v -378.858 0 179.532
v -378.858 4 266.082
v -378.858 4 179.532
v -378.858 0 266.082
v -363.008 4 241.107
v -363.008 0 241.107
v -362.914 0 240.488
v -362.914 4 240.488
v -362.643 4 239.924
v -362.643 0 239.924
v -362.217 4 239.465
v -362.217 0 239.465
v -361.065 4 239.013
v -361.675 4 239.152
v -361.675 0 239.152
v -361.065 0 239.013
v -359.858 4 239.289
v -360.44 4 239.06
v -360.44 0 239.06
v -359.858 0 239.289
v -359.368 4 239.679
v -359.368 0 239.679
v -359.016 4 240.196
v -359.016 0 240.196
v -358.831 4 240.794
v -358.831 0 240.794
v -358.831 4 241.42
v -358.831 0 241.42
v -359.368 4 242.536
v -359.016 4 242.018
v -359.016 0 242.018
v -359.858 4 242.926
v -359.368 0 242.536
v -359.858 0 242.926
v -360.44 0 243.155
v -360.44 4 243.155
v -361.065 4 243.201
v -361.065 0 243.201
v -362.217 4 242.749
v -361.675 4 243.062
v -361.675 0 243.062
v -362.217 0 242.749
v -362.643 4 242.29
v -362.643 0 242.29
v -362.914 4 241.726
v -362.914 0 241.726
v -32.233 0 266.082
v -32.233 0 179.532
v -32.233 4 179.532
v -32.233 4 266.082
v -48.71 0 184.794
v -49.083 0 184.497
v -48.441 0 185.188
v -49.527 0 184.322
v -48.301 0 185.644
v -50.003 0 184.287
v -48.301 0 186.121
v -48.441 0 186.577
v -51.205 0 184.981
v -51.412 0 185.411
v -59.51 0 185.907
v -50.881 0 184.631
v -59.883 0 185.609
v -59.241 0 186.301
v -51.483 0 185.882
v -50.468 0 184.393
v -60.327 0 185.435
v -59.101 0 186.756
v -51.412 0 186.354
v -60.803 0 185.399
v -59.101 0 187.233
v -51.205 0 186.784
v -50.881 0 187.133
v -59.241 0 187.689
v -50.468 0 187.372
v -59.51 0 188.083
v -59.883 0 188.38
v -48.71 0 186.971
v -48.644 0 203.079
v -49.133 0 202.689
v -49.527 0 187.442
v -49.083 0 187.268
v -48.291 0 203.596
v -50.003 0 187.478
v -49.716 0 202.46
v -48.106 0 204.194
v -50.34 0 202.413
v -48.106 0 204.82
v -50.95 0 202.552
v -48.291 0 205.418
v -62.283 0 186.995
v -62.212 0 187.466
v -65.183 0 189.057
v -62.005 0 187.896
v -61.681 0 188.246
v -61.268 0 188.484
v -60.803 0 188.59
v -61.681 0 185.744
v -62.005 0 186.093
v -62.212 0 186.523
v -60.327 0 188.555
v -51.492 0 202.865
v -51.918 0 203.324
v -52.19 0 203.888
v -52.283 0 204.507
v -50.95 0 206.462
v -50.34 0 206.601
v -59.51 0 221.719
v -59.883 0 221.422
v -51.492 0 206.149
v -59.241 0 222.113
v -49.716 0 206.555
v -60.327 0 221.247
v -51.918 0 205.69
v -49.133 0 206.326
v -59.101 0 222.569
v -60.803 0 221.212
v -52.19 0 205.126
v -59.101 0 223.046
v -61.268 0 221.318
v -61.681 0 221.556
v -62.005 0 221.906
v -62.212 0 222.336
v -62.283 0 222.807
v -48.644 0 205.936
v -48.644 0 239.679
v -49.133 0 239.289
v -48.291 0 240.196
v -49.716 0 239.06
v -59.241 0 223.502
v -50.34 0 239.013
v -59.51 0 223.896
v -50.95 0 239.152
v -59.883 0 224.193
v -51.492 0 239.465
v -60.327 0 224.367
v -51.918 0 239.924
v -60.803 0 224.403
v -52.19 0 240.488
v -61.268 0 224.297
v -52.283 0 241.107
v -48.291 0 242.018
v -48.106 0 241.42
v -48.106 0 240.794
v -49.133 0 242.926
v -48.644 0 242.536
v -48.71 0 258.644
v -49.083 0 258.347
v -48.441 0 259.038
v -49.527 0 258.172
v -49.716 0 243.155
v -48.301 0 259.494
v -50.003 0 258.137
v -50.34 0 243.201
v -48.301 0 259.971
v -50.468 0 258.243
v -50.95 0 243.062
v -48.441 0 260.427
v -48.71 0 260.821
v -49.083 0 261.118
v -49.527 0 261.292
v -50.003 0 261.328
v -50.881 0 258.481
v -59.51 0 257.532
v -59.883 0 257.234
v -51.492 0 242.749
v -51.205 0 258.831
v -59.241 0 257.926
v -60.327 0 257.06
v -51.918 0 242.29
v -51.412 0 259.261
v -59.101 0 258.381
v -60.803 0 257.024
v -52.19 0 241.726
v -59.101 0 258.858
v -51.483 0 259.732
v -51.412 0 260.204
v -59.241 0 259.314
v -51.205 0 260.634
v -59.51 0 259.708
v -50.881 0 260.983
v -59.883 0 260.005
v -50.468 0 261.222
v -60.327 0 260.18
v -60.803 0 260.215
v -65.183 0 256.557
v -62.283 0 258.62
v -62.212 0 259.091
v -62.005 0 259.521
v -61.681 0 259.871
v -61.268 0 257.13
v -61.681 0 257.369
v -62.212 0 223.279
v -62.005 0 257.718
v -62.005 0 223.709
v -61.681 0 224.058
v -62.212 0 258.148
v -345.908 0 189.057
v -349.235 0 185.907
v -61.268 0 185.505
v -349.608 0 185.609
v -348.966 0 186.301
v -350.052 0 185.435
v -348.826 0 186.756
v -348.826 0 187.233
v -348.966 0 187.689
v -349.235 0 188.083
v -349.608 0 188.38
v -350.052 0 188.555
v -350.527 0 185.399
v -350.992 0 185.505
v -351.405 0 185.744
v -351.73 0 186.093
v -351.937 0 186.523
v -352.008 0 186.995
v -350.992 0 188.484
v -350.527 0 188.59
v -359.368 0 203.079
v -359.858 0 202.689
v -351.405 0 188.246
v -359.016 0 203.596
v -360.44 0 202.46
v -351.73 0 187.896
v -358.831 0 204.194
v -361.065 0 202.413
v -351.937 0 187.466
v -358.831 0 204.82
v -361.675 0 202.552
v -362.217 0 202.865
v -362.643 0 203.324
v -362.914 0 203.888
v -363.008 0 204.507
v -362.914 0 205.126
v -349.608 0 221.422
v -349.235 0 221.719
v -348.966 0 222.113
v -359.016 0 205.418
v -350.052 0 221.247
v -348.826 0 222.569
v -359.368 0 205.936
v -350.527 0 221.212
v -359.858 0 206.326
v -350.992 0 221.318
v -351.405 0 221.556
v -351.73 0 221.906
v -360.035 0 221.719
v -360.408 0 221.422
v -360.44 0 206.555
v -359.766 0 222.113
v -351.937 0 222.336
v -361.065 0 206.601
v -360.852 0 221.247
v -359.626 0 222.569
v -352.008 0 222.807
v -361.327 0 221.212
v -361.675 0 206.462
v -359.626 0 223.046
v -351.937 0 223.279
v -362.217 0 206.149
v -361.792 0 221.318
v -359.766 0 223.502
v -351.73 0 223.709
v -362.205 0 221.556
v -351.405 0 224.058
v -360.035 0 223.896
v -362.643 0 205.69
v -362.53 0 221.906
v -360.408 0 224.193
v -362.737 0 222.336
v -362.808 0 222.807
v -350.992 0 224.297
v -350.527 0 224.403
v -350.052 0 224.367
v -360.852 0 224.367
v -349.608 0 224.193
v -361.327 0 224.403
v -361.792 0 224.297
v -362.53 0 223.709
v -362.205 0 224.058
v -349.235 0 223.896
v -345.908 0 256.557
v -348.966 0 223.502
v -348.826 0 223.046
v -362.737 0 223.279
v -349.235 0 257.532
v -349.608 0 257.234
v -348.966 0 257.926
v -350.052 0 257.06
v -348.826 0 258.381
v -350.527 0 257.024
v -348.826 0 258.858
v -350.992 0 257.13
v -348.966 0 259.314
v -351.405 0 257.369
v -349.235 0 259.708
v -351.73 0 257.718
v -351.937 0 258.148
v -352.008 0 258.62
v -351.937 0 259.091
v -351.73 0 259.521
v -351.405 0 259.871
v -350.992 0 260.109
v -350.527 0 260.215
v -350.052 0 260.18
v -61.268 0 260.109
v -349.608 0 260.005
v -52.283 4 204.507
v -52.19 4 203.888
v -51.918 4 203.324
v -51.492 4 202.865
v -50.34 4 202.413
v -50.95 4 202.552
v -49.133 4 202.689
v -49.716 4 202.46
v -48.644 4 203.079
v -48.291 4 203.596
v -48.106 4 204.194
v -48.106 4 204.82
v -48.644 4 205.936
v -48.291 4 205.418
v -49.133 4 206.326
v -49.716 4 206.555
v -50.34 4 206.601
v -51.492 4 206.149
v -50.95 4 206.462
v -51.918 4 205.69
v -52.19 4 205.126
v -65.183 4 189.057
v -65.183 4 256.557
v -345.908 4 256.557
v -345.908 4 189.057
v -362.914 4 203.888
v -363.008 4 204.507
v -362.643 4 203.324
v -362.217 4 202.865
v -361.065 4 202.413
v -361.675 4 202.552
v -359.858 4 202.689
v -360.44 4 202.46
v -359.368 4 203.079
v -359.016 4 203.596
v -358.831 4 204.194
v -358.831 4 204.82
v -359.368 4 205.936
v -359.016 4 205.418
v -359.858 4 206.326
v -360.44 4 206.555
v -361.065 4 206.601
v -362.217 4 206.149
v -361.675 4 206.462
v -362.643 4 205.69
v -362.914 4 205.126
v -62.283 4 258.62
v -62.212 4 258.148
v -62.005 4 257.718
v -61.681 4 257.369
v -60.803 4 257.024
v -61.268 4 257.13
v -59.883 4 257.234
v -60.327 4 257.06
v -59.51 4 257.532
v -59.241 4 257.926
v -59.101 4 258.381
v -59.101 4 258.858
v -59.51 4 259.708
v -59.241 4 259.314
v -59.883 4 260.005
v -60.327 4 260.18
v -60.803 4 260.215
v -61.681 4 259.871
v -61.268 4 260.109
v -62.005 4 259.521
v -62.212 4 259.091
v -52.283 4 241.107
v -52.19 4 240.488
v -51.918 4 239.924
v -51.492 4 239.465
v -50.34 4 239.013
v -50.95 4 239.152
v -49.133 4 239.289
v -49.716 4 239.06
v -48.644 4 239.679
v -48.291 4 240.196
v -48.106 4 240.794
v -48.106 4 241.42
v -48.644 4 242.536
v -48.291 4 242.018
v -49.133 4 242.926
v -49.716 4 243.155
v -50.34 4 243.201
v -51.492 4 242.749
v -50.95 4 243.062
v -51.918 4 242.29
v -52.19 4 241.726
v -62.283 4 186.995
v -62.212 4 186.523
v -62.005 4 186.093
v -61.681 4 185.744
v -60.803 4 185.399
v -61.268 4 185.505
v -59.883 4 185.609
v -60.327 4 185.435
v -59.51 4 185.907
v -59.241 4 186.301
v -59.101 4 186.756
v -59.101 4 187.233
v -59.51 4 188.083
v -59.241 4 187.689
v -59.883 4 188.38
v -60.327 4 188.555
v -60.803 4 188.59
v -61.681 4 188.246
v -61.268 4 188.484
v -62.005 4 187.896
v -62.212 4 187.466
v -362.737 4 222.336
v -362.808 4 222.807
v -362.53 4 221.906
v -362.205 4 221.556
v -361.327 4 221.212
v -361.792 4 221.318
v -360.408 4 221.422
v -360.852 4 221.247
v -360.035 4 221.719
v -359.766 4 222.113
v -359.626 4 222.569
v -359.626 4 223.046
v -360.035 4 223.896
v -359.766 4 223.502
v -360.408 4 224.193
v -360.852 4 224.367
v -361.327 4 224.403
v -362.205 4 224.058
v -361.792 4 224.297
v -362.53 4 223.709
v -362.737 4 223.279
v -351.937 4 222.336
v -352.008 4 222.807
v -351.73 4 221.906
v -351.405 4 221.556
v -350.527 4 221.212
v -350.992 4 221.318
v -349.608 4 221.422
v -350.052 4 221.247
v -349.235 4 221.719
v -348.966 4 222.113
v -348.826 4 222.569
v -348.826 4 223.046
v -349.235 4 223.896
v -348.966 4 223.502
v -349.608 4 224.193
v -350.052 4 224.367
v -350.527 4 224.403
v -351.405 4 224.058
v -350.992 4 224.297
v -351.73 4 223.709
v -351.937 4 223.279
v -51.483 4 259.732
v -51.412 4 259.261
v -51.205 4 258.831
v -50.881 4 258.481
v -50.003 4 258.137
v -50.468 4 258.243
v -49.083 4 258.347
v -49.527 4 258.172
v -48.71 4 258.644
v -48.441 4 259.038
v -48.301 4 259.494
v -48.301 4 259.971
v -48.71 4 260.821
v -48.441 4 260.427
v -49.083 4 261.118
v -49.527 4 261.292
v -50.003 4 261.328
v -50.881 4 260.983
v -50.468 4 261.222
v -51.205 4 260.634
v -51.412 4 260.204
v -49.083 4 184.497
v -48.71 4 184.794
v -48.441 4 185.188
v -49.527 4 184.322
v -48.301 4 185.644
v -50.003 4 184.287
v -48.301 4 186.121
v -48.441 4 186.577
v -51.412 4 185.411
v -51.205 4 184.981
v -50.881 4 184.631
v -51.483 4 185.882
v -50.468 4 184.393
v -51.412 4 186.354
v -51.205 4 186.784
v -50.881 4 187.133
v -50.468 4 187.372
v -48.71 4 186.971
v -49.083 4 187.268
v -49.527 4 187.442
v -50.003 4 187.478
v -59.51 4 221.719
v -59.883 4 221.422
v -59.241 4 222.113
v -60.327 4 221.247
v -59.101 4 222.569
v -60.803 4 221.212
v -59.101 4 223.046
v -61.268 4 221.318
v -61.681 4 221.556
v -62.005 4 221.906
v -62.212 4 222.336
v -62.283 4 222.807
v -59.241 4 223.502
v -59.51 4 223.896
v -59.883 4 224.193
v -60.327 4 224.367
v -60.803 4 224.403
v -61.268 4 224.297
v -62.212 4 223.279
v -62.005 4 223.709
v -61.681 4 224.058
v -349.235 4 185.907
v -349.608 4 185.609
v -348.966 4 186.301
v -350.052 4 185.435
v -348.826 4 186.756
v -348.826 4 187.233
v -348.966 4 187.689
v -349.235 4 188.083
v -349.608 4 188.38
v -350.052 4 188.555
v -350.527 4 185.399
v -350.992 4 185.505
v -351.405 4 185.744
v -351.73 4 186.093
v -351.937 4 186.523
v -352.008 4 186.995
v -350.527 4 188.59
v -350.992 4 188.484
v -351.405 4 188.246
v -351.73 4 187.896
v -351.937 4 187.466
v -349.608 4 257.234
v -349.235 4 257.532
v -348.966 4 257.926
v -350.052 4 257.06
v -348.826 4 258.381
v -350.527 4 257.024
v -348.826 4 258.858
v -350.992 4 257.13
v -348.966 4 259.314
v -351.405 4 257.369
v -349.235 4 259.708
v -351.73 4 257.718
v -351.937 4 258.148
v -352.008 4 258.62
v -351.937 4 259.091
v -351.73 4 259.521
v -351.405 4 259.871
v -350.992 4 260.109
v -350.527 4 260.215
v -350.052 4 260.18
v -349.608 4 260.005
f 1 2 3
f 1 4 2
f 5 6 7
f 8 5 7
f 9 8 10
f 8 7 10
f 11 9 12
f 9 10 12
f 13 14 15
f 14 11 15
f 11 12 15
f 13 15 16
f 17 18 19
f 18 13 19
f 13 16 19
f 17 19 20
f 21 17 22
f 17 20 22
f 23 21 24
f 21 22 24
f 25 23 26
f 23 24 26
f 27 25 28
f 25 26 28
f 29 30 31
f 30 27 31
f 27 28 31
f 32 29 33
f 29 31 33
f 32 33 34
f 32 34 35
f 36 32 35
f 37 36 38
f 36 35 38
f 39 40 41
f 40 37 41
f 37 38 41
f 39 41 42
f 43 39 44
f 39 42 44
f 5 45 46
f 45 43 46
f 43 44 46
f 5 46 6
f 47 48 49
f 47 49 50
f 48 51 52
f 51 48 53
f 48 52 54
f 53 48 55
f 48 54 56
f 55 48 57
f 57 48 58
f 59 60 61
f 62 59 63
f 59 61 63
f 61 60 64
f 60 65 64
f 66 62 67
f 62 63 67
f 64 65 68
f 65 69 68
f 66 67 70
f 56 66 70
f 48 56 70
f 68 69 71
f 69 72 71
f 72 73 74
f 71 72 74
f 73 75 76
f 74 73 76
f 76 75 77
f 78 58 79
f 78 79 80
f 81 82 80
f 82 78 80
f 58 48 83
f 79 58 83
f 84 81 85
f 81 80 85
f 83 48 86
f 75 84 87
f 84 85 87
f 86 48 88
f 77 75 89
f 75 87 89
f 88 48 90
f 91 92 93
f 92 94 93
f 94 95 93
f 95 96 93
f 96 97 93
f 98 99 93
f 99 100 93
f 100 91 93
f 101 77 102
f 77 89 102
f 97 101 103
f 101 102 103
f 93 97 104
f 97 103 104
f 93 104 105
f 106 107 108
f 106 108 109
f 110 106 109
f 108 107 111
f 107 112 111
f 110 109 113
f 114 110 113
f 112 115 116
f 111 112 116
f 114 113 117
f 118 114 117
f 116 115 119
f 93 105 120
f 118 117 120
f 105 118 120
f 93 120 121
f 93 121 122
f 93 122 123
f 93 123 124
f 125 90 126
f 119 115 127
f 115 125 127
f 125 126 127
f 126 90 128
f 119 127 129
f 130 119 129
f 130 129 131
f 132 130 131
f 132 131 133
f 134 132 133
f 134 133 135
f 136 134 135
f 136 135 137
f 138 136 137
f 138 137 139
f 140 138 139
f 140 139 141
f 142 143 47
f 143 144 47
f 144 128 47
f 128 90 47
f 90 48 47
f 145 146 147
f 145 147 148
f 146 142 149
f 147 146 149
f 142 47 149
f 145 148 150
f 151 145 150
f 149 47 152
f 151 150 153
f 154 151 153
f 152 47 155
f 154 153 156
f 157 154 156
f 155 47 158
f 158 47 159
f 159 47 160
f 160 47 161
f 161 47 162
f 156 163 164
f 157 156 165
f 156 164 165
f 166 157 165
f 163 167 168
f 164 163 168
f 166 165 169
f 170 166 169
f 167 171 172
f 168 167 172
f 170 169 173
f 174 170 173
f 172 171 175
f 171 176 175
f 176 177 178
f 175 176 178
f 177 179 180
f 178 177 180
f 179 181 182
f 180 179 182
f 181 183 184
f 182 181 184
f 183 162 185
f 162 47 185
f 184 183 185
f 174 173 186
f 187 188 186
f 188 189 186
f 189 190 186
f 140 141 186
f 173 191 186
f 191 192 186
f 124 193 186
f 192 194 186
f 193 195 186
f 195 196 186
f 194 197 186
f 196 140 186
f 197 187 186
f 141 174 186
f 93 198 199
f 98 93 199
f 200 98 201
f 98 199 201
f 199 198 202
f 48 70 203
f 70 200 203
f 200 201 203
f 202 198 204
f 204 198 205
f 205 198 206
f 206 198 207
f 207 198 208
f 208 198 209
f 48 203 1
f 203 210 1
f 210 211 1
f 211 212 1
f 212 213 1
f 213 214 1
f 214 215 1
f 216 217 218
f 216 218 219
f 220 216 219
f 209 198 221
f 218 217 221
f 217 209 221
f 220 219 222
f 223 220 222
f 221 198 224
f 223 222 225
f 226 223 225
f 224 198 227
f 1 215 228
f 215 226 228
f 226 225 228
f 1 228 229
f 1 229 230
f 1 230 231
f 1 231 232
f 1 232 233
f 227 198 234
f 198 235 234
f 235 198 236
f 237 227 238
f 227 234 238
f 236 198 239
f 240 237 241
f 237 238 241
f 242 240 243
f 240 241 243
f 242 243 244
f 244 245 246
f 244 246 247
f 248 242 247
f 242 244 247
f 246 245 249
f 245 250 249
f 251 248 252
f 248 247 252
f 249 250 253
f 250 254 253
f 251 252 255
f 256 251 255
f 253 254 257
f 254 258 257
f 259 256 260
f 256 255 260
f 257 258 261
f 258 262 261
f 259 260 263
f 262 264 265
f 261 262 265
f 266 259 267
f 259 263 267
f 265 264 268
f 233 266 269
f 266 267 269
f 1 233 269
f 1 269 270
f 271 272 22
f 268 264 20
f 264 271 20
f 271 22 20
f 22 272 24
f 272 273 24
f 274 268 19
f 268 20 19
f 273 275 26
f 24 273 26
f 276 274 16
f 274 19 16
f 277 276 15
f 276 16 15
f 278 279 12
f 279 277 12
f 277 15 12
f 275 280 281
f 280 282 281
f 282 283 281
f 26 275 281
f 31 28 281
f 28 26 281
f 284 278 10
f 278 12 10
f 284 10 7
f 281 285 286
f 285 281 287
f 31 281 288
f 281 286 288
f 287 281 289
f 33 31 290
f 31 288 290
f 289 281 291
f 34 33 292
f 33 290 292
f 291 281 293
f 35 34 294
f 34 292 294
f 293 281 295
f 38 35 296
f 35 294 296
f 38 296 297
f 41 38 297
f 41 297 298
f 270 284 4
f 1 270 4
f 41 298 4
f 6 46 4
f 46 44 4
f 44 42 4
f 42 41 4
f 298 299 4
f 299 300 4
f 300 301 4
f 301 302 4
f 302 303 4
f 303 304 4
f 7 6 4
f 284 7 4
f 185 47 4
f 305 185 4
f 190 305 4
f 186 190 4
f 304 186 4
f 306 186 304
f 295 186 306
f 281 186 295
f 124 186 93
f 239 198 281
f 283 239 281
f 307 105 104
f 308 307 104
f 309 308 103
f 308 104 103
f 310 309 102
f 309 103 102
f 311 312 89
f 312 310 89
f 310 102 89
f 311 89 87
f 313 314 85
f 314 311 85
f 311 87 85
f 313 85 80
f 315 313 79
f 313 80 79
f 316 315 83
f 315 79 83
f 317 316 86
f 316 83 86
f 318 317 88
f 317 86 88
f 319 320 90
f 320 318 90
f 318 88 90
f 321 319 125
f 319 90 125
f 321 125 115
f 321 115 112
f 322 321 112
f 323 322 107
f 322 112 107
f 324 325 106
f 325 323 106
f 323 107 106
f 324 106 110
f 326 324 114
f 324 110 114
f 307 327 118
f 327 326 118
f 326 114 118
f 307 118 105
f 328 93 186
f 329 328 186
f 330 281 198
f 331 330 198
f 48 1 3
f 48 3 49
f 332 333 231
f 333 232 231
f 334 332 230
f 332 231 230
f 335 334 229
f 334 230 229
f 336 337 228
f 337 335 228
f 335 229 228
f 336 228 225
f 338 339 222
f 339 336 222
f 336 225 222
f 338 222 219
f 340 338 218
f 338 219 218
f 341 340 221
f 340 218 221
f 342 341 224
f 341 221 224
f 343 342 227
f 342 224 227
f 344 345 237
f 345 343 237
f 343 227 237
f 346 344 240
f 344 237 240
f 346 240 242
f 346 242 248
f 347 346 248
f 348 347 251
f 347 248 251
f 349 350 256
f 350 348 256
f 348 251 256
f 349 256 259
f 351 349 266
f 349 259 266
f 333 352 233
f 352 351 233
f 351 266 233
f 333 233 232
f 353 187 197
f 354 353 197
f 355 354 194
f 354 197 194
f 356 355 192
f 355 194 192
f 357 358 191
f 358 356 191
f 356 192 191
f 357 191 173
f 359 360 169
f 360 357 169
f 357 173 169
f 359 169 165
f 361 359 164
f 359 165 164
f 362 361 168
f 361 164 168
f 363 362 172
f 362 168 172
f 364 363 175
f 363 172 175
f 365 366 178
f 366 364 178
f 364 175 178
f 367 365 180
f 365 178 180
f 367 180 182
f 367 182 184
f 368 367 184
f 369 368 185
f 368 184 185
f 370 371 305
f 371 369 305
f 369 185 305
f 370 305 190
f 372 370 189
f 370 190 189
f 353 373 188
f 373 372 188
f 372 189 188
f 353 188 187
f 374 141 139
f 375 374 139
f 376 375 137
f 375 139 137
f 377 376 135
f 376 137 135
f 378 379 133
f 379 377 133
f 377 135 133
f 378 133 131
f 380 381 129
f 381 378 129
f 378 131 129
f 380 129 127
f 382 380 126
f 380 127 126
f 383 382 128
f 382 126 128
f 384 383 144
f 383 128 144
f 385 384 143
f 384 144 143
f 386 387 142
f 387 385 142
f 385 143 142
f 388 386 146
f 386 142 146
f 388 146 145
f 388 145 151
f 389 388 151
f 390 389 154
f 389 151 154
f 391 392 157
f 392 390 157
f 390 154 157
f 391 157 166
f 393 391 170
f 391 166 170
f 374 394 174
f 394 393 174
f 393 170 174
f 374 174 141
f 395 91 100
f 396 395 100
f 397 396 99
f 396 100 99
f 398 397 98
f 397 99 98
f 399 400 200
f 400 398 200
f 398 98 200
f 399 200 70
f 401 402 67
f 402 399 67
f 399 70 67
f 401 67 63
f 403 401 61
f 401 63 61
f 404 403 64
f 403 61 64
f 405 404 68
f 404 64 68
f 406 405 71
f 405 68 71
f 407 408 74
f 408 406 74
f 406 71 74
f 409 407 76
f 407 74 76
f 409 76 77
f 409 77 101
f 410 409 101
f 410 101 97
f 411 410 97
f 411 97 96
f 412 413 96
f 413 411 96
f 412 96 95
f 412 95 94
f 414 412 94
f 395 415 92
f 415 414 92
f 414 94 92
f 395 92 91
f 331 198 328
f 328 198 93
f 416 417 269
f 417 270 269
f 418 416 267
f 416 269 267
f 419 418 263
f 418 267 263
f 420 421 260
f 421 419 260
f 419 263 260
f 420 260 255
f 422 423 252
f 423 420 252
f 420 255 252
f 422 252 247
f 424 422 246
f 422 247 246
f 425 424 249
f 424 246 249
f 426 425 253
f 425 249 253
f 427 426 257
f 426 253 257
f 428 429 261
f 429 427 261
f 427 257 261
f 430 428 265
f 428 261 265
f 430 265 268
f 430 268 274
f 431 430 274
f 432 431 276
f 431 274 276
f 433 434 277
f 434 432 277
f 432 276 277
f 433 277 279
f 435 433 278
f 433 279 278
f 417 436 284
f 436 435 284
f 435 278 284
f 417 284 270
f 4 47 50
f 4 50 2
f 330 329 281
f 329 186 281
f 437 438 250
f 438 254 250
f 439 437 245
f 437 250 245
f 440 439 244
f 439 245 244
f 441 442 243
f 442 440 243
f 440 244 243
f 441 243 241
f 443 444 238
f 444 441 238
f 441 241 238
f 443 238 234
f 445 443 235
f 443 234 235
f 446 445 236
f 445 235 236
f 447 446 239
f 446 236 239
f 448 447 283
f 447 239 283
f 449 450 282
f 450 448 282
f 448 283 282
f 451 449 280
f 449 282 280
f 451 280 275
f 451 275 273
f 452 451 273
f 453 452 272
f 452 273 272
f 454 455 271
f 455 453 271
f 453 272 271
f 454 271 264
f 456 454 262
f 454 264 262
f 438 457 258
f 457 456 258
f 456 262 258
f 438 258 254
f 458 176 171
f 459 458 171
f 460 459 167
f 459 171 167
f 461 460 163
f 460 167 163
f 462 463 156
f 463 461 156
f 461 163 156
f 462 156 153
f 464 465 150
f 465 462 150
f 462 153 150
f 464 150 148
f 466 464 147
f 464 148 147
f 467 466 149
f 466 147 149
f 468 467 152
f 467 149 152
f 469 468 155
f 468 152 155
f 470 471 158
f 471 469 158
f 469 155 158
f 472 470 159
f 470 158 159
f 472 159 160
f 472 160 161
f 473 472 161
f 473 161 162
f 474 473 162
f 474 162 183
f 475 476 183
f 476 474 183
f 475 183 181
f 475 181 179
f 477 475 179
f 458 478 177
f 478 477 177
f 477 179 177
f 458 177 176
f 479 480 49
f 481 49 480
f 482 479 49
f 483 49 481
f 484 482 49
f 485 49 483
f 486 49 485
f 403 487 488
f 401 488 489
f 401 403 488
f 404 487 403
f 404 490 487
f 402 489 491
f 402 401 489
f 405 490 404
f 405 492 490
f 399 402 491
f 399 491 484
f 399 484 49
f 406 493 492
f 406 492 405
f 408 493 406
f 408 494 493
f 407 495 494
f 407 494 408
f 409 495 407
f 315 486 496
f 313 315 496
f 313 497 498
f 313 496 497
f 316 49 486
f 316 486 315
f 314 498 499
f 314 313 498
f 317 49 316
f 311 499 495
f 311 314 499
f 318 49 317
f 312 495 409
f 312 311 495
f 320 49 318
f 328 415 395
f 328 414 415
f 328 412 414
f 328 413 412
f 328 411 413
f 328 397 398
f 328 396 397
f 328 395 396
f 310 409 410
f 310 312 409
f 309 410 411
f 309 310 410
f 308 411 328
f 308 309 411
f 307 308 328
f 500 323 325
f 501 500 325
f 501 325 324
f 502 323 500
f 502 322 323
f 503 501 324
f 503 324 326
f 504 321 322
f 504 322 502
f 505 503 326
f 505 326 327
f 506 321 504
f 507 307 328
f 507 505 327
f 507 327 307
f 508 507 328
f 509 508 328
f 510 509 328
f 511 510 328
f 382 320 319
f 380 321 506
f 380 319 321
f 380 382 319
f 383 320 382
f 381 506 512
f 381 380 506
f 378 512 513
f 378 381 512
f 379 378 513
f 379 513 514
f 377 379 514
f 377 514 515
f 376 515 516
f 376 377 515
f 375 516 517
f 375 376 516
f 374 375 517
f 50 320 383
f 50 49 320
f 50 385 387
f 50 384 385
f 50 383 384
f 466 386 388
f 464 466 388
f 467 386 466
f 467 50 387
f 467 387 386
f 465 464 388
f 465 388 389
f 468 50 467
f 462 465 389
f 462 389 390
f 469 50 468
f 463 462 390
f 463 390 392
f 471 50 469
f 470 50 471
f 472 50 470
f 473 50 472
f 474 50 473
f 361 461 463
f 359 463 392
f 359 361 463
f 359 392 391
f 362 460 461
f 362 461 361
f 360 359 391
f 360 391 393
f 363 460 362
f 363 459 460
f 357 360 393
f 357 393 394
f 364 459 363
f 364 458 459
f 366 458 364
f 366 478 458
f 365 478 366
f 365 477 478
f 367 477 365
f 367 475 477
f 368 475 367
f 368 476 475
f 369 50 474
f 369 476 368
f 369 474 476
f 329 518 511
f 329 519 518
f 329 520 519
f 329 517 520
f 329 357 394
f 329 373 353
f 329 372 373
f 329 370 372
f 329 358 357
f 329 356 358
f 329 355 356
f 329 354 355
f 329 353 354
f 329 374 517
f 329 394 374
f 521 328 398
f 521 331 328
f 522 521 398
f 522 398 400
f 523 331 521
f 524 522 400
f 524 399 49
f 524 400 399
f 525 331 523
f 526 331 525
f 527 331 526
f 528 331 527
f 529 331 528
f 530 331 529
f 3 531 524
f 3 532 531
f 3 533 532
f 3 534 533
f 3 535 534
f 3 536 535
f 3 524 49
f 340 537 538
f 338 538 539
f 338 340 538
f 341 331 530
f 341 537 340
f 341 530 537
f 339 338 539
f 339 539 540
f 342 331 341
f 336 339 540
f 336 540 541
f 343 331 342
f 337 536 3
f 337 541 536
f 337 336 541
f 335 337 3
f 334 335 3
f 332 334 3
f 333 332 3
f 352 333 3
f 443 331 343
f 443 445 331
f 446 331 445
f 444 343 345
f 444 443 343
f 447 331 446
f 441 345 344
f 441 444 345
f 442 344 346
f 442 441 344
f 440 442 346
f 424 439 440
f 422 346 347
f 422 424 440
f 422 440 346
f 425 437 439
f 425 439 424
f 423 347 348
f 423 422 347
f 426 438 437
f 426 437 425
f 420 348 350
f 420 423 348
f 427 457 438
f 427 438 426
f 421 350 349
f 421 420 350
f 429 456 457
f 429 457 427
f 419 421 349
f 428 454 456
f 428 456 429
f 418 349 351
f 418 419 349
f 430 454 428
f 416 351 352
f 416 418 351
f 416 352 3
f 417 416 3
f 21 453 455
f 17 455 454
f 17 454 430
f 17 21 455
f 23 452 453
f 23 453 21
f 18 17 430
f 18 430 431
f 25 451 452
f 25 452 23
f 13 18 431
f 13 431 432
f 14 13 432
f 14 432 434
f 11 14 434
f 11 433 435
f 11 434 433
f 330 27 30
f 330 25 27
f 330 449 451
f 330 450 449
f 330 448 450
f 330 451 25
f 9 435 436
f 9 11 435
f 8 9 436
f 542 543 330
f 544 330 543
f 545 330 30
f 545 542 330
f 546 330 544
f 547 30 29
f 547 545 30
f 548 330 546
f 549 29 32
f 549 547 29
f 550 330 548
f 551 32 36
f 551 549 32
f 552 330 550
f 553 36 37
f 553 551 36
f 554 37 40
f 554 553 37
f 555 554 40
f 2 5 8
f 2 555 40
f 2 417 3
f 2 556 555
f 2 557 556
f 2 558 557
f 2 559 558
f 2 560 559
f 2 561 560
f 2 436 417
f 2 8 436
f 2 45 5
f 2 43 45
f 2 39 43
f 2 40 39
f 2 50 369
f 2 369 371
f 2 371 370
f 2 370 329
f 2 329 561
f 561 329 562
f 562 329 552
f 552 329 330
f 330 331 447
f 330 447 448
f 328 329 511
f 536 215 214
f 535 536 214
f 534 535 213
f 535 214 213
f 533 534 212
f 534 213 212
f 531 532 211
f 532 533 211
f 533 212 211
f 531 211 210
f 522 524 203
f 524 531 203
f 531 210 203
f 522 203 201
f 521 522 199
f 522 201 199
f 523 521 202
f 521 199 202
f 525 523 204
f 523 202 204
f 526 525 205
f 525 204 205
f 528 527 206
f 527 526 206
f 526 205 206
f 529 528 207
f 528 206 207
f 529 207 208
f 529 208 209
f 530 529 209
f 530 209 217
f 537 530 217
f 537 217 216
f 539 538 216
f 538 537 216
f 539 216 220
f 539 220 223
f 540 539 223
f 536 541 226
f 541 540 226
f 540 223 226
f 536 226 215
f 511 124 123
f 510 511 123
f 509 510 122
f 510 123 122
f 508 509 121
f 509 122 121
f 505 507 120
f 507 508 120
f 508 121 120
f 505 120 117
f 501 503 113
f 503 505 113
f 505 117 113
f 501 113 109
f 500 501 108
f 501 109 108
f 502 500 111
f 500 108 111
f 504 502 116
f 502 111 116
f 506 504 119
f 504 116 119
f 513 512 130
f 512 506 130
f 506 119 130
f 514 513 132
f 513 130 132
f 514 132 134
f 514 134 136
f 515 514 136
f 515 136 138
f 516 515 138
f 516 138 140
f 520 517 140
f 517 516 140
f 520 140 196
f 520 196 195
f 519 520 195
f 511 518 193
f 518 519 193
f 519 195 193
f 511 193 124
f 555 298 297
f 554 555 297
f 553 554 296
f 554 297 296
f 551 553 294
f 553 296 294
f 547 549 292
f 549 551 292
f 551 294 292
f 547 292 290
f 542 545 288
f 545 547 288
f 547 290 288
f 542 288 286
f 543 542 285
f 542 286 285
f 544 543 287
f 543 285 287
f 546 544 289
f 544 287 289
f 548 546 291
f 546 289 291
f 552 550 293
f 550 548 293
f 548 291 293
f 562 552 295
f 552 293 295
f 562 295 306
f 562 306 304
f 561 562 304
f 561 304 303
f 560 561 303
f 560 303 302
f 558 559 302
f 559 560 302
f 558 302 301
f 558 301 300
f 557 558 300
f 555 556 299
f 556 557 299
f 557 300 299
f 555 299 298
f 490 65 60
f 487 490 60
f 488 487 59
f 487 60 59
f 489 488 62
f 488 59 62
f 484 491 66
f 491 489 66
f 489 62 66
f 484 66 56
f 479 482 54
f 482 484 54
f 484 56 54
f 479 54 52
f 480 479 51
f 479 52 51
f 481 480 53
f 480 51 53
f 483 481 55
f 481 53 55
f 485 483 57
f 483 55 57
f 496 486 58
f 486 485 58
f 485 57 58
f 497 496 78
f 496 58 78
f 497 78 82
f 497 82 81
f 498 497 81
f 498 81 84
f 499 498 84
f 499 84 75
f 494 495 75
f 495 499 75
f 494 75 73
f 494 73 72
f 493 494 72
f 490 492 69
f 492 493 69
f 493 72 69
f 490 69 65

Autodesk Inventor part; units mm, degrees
ref_plane "YZ Plane" through (0, 0, 0) normal (1, 0, 0) x (0, 1, 0)
ref_plane "XZ Plane" through (0, 0, 0) normal (0, 1, 0) x (-1, 0, 0)
ref_plane "XY Plane" through (0, 0, 0) normal (0, 0, 1) x (1, 0, 0)
sketch "Sketch1" plane through (0, 0, 0) normal (0, 1, 0) x (-1, 0, 0)
  line L0 (381.1493, 61.7688) -> (30.4355, 61.7688)
  line L1 (380.945, 412.5458) -> (381.1493, 61.7688)
  line L2 (30.2312, 412.5458) -> (380.945, 412.5458)
  line L3 (30.4355, 61.7688) -> (30.4355, 412.5458)
  arc A0 (0.0979, 16.0688) -> (16.0979, 0.0688) centre (16.0979, 16.0688) ccw
  line L4 (0.1355, 16.0688) -> (-0.0688, 429.5458)
  arc A1 (15.9312, 445.5458) -> (-0.0688, 429.5458) centre (15.9312, 429.5458) ccw
  line L5 (15.9312, 445.5458) -> (395.245, 445.5458)
  arc A2 (411.245, 429.5458) -> (395.245, 445.5458) centre (395.245, 429.5458) ccw
  line L6 (411.245, 429.5458) -> (411.4493, 16.0688)
  arc A3 (395.4117, 0.0688) -> (411.4117, 16.0688) centre (395.4117, 16.0688) ccw
  line L7 (395.4117, 0.0688) -> (16.0979, 0.0688)
  arc A4 (21.3729, 6.5688) -> (25.1229, 6.5688) centre (23.2479, 6.5688) ccw
  line L8 (25.1229, 10.5688) -> (25.1229, 6.5688)
  arc A5 (25.1229, 10.5688) -> (21.3729, 10.5688) centre (23.2479, 10.5688) ccw
  line L9 (21.3729, 6.5688) -> (21.3729, 10.5688)
  arc A6 (52.3729, 6.5688) -> (56.1229, 6.5688) centre (54.2479, 6.5688) ccw
  line L10 (56.1229, 10.5688) -> (56.1229, 6.5688)
  arc A7 (56.1229, 10.5688) -> (52.3729, 10.5688) centre (54.2479, 10.5688) ccw
  line L11 (52.3729, 6.5688) -> (52.3729, 10.5688)
  arc A8 (21.3729, 37.5688) -> (25.1229, 37.5688) centre (23.2479, 37.5688) ccw
  line L12 (25.1229, 41.5688) -> (25.1229, 37.5688)
  arc A9 (25.1229, 41.5688) -> (21.3729, 41.5688) centre (23.2479, 41.5688) ccw
  line L13 (21.3729, 37.5688) -> (21.3729, 41.5688)
  arc A10 (52.3729, 37.5688) -> (56.1229, 37.5688) centre (54.2479, 37.5688) ccw
  line L14 (56.1229, 41.5688) -> (56.1229, 37.5688)
  arc A11 (56.1229, 41.5688) -> (52.3729, 41.5688) centre (54.2479, 41.5688) ccw
  line L15 (52.3729, 37.5688) -> (52.3729, 41.5688)
  arc A12 (26.7479, 22.0688) -> (50.7479, 22.0688) centre (38.7479, 22.0688) ccw
  line L16 (50.7479, 26.0688) -> (50.7479, 22.0688)
  arc A13 (50.7479, 26.0688) -> (26.7479, 26.0688) centre (38.7479, 26.0688) ccw
  line L17 (26.7479, 22.0688) -> (26.7479, 26.0688)
  arc A14 (355.4177, 6.5688) -> (359.1677, 6.5688) centre (357.2927, 6.5688) ccw
  line L18 (359.1677, 10.5688) -> (359.1677, 6.5688)
  arc A15 (359.1677, 10.5688) -> (355.4177, 10.5688) centre (357.2927, 10.5688) ccw
  line L19 (355.3867, 6.5688) -> (355.3867, 10.5688)
  arc A16 (386.3692, 6.5688) -> (390.1192, 6.5688) centre (388.2442, 6.5127) ccw
  arc A17 (386.3762, 37.5688) -> (390.1262, 37.5688) centre (388.2512, 37.5688) ccw
  line L20 (390.1262, 41.5688) -> (390.1262, 37.5688)
  arc A18 (390.1367, 41.5688) -> (386.3867, 41.5688) centre (388.2617, 41.5688) ccw
  line L21 (386.3762, 37.5688) -> (386.3762, 41.5688)
  arc A19 (355.3676, 37.5688) -> (359.1176, 37.5688) centre (357.2426, 37.5688) ccw
  line L22 (359.1176, 41.5688) -> (359.1176, 37.5688)
  arc A20 (359.1367, 41.5688) -> (355.3867, 41.5688) centre (357.2617, 41.5688) ccw
  line L23 (355.3676, 37.5688) -> (355.3676, 41.5688)
  arc A21 (360.7225, 22.0688) -> (384.7225, 22.0688) centre (372.7225, 22.0688) ccw
  line L24 (384.7225, 26.0688) -> (384.7225, 22.0688)
  arc A22 (384.7617, 26.0688) -> (360.7617, 26.0688) centre (372.7617, 26.0688) ccw
  line L25 (360.7225, 22.0688) -> (360.7225, 26.0688)
  circle A23 centre (50.1812, 420.5458) radius 2.1
  circle A24 centre (38.5812, 435.5458) radius 2.1
  circle A25 centre (372.595, 435.5458) radius 2.1
  circle A26 centre (360.995, 420.5458) radius 2.1
  circle A27 centre (25.8187, 418.0458) radius 1.6
  circle A28 centre (66.8187, 418.0458) radius 1.6
  circle A29 centre (205.5881, 418.0458) radius 1.6
  circle A30 centre (344.3575, 418.0458) radius 1.6
  circle A31 centre (385.3575, 418.0458) radius 1.6
  circle A32 centre (385.3575, 56.2688) radius 1
  circle A33 centre (344.3575, 56.2688) radius 1
  circle A34 centre (205.5881, 56.2688) radius 1
  circle A35 centre (66.8187, 56.2688) radius 1
  circle A36 centre (25.8187, 56.2688) radius 1
  arc A37 (390.1367, 10.5688) -> (386.3867, 10.5688) centre (388.2617, 10.5688) ccw
  line L26 (378.8577, 179.5323) -> (32.233, 179.5323)
  circle A38 centre (60.683, 222.8073) radius 1.6
  circle A39 centre (60.683, 258.6198) radius 1.6
  circle A40 centre (60.683, 186.9948) radius 1.6
  circle A41 centre (350.4077, 186.9948) radius 1.6
  circle A42 centre (350.4077, 222.8073) radius 1.6
  circle A43 centre (350.4077, 258.6198) radius 1.6
  circle A44 centre (49.883, 185.8823) radius 1.6
  circle A45 centre (49.883, 259.7323) radius 1.6
  circle A46 centre (361.2077, 222.8073) radius 1.6
  line L27 (378.8577, 266.0823) -> (378.8577, 179.5323)
  line L28 (345.9077, 256.5573) -> (345.9077, 189.0573)
  line L29 (65.183, 256.5573) -> (345.9077, 256.5573)
  line L30 (65.183, 189.0573) -> (65.183, 256.5573)
  line L31 (345.9077, 189.0573) -> (65.183, 189.0573)
  line L32 (32.233, 179.5323) -> (32.233, 266.0823)
  line L33 (32.233, 266.0823) -> (378.8577, 266.0823)
  circle A47 centre (50.183, 204.5073) radius 2.1
  circle A48 centre (360.9077, 204.5073) radius 2.1
  circle A49 centre (360.9077, 241.1073) radius 2.1
  circle A50 centre (50.183, 241.1073) radius 2.1
  line L34 (224.6381, 203.7573) -> (186.5381, 203.7573)
  line L35 (224.6381, 207.8163) -> (224.6381, 203.7573)
  arc A51 (226.0481, 209.3136) -> (224.6381, 207.8163) centre (226.1381, 207.8163) ccw
  arc A52 (226.0481, 209.3136) -> (226.0481, 216.301) centre (225.8381, 212.8073) ccw
  arc A53 (224.6381, 217.7983) -> (226.0481, 216.301) centre (226.1381, 217.7983) ccw
  arc A54 (226.0481, 229.3136) -> (224.6381, 227.8163) centre (226.1381, 227.8163) ccw
  arc A55 (226.0481, 229.3136) -> (226.0481, 236.301) centre (225.8381, 232.8073) ccw
  arc A56 (224.6381, 237.7983) -> (226.0481, 236.301) centre (226.1381, 237.7983) ccw
  line L36 (186.5381, 241.8573) -> (224.6381, 241.8573)
  line L37 (186.5381, 237.7983) -> (186.5381, 241.8573)
  arc A57 (185.1281, 236.301) -> (186.5381, 237.7983) centre (185.0381, 237.7983) ccw
  arc A58 (185.1281, 236.301) -> (185.1281, 229.3136) centre (185.3381, 232.8073) ccw
  arc A59 (186.5381, 227.8163) -> (185.1281, 229.3136) centre (185.0381, 227.8163) ccw
  arc A60 (185.1281, 216.301) -> (186.5381, 217.7983) centre (185.0381, 217.7983) ccw
  arc A61 (185.1281, 216.301) -> (185.1281, 209.3136) centre (185.3381, 212.8073) ccw
  arc A62 (186.5381, 207.8163) -> (185.1281, 209.3136) centre (185.0381, 207.8163) ccw
  line L38 (173.8381, 254.5573) -> (237.3381, 254.5573)
  line L39 (237.3381, 254.5573) -> (237.3381, 191.0573)
  line L40 (237.3381, 191.0573) -> (173.8381, 191.0573)
  line L41 (173.8381, 191.0573) -> (173.8381, 254.5573)
  circle A63 centre (180.1881, 196.9948) radius 0.875
  circle A64 centre (230.9881, 196.9948) radius 0.875
  circle A65 centre (230.9881, 248.6198) radius 0.875
  circle A66 centre (180.1881, 248.6198) radius 0.875
  circle A67 centre (177.8381, 232.8073) radius 0.875
  circle A68 centre (233.3381, 232.8073) radius 0.875
  circle A69 centre (233.3381, 212.8073) radius 0.875
  circle A70 centre (177.8381, 212.8073) radius 0.875
  line L42 (186.5381, 203.7573) -> (186.5381, 207.8163)
  line L43 (186.5381, 217.7983) -> (186.5381, 227.8163)
  line L44 (224.6381, 241.8573) -> (224.6381, 237.7983)
  line L45 (224.6381, 227.8163) -> (224.6381, 217.7983)
  line L46 (390.1367, 10.5688) -> (390.1367, 6.5605)
  line L47 (386.3867, 10.5688) -> (386.3867, 6.2509)
  circle A71 centre (136.8187, 56.2688) radius 1
  circle A72 centre (273.8511, 56.2688) radius 1
  circle A73 centre (274.3575, 418.0458) radius 1.6
  circle A74 centre (136.8187, 418.0458) radius 1.6
  point P0 (0, 0)
extrude "Extrusion1" add sketch "Sketch1" along normal blind 4 contours L26 L32 L33 L27
properties part number "300 mm core xy gantry"
